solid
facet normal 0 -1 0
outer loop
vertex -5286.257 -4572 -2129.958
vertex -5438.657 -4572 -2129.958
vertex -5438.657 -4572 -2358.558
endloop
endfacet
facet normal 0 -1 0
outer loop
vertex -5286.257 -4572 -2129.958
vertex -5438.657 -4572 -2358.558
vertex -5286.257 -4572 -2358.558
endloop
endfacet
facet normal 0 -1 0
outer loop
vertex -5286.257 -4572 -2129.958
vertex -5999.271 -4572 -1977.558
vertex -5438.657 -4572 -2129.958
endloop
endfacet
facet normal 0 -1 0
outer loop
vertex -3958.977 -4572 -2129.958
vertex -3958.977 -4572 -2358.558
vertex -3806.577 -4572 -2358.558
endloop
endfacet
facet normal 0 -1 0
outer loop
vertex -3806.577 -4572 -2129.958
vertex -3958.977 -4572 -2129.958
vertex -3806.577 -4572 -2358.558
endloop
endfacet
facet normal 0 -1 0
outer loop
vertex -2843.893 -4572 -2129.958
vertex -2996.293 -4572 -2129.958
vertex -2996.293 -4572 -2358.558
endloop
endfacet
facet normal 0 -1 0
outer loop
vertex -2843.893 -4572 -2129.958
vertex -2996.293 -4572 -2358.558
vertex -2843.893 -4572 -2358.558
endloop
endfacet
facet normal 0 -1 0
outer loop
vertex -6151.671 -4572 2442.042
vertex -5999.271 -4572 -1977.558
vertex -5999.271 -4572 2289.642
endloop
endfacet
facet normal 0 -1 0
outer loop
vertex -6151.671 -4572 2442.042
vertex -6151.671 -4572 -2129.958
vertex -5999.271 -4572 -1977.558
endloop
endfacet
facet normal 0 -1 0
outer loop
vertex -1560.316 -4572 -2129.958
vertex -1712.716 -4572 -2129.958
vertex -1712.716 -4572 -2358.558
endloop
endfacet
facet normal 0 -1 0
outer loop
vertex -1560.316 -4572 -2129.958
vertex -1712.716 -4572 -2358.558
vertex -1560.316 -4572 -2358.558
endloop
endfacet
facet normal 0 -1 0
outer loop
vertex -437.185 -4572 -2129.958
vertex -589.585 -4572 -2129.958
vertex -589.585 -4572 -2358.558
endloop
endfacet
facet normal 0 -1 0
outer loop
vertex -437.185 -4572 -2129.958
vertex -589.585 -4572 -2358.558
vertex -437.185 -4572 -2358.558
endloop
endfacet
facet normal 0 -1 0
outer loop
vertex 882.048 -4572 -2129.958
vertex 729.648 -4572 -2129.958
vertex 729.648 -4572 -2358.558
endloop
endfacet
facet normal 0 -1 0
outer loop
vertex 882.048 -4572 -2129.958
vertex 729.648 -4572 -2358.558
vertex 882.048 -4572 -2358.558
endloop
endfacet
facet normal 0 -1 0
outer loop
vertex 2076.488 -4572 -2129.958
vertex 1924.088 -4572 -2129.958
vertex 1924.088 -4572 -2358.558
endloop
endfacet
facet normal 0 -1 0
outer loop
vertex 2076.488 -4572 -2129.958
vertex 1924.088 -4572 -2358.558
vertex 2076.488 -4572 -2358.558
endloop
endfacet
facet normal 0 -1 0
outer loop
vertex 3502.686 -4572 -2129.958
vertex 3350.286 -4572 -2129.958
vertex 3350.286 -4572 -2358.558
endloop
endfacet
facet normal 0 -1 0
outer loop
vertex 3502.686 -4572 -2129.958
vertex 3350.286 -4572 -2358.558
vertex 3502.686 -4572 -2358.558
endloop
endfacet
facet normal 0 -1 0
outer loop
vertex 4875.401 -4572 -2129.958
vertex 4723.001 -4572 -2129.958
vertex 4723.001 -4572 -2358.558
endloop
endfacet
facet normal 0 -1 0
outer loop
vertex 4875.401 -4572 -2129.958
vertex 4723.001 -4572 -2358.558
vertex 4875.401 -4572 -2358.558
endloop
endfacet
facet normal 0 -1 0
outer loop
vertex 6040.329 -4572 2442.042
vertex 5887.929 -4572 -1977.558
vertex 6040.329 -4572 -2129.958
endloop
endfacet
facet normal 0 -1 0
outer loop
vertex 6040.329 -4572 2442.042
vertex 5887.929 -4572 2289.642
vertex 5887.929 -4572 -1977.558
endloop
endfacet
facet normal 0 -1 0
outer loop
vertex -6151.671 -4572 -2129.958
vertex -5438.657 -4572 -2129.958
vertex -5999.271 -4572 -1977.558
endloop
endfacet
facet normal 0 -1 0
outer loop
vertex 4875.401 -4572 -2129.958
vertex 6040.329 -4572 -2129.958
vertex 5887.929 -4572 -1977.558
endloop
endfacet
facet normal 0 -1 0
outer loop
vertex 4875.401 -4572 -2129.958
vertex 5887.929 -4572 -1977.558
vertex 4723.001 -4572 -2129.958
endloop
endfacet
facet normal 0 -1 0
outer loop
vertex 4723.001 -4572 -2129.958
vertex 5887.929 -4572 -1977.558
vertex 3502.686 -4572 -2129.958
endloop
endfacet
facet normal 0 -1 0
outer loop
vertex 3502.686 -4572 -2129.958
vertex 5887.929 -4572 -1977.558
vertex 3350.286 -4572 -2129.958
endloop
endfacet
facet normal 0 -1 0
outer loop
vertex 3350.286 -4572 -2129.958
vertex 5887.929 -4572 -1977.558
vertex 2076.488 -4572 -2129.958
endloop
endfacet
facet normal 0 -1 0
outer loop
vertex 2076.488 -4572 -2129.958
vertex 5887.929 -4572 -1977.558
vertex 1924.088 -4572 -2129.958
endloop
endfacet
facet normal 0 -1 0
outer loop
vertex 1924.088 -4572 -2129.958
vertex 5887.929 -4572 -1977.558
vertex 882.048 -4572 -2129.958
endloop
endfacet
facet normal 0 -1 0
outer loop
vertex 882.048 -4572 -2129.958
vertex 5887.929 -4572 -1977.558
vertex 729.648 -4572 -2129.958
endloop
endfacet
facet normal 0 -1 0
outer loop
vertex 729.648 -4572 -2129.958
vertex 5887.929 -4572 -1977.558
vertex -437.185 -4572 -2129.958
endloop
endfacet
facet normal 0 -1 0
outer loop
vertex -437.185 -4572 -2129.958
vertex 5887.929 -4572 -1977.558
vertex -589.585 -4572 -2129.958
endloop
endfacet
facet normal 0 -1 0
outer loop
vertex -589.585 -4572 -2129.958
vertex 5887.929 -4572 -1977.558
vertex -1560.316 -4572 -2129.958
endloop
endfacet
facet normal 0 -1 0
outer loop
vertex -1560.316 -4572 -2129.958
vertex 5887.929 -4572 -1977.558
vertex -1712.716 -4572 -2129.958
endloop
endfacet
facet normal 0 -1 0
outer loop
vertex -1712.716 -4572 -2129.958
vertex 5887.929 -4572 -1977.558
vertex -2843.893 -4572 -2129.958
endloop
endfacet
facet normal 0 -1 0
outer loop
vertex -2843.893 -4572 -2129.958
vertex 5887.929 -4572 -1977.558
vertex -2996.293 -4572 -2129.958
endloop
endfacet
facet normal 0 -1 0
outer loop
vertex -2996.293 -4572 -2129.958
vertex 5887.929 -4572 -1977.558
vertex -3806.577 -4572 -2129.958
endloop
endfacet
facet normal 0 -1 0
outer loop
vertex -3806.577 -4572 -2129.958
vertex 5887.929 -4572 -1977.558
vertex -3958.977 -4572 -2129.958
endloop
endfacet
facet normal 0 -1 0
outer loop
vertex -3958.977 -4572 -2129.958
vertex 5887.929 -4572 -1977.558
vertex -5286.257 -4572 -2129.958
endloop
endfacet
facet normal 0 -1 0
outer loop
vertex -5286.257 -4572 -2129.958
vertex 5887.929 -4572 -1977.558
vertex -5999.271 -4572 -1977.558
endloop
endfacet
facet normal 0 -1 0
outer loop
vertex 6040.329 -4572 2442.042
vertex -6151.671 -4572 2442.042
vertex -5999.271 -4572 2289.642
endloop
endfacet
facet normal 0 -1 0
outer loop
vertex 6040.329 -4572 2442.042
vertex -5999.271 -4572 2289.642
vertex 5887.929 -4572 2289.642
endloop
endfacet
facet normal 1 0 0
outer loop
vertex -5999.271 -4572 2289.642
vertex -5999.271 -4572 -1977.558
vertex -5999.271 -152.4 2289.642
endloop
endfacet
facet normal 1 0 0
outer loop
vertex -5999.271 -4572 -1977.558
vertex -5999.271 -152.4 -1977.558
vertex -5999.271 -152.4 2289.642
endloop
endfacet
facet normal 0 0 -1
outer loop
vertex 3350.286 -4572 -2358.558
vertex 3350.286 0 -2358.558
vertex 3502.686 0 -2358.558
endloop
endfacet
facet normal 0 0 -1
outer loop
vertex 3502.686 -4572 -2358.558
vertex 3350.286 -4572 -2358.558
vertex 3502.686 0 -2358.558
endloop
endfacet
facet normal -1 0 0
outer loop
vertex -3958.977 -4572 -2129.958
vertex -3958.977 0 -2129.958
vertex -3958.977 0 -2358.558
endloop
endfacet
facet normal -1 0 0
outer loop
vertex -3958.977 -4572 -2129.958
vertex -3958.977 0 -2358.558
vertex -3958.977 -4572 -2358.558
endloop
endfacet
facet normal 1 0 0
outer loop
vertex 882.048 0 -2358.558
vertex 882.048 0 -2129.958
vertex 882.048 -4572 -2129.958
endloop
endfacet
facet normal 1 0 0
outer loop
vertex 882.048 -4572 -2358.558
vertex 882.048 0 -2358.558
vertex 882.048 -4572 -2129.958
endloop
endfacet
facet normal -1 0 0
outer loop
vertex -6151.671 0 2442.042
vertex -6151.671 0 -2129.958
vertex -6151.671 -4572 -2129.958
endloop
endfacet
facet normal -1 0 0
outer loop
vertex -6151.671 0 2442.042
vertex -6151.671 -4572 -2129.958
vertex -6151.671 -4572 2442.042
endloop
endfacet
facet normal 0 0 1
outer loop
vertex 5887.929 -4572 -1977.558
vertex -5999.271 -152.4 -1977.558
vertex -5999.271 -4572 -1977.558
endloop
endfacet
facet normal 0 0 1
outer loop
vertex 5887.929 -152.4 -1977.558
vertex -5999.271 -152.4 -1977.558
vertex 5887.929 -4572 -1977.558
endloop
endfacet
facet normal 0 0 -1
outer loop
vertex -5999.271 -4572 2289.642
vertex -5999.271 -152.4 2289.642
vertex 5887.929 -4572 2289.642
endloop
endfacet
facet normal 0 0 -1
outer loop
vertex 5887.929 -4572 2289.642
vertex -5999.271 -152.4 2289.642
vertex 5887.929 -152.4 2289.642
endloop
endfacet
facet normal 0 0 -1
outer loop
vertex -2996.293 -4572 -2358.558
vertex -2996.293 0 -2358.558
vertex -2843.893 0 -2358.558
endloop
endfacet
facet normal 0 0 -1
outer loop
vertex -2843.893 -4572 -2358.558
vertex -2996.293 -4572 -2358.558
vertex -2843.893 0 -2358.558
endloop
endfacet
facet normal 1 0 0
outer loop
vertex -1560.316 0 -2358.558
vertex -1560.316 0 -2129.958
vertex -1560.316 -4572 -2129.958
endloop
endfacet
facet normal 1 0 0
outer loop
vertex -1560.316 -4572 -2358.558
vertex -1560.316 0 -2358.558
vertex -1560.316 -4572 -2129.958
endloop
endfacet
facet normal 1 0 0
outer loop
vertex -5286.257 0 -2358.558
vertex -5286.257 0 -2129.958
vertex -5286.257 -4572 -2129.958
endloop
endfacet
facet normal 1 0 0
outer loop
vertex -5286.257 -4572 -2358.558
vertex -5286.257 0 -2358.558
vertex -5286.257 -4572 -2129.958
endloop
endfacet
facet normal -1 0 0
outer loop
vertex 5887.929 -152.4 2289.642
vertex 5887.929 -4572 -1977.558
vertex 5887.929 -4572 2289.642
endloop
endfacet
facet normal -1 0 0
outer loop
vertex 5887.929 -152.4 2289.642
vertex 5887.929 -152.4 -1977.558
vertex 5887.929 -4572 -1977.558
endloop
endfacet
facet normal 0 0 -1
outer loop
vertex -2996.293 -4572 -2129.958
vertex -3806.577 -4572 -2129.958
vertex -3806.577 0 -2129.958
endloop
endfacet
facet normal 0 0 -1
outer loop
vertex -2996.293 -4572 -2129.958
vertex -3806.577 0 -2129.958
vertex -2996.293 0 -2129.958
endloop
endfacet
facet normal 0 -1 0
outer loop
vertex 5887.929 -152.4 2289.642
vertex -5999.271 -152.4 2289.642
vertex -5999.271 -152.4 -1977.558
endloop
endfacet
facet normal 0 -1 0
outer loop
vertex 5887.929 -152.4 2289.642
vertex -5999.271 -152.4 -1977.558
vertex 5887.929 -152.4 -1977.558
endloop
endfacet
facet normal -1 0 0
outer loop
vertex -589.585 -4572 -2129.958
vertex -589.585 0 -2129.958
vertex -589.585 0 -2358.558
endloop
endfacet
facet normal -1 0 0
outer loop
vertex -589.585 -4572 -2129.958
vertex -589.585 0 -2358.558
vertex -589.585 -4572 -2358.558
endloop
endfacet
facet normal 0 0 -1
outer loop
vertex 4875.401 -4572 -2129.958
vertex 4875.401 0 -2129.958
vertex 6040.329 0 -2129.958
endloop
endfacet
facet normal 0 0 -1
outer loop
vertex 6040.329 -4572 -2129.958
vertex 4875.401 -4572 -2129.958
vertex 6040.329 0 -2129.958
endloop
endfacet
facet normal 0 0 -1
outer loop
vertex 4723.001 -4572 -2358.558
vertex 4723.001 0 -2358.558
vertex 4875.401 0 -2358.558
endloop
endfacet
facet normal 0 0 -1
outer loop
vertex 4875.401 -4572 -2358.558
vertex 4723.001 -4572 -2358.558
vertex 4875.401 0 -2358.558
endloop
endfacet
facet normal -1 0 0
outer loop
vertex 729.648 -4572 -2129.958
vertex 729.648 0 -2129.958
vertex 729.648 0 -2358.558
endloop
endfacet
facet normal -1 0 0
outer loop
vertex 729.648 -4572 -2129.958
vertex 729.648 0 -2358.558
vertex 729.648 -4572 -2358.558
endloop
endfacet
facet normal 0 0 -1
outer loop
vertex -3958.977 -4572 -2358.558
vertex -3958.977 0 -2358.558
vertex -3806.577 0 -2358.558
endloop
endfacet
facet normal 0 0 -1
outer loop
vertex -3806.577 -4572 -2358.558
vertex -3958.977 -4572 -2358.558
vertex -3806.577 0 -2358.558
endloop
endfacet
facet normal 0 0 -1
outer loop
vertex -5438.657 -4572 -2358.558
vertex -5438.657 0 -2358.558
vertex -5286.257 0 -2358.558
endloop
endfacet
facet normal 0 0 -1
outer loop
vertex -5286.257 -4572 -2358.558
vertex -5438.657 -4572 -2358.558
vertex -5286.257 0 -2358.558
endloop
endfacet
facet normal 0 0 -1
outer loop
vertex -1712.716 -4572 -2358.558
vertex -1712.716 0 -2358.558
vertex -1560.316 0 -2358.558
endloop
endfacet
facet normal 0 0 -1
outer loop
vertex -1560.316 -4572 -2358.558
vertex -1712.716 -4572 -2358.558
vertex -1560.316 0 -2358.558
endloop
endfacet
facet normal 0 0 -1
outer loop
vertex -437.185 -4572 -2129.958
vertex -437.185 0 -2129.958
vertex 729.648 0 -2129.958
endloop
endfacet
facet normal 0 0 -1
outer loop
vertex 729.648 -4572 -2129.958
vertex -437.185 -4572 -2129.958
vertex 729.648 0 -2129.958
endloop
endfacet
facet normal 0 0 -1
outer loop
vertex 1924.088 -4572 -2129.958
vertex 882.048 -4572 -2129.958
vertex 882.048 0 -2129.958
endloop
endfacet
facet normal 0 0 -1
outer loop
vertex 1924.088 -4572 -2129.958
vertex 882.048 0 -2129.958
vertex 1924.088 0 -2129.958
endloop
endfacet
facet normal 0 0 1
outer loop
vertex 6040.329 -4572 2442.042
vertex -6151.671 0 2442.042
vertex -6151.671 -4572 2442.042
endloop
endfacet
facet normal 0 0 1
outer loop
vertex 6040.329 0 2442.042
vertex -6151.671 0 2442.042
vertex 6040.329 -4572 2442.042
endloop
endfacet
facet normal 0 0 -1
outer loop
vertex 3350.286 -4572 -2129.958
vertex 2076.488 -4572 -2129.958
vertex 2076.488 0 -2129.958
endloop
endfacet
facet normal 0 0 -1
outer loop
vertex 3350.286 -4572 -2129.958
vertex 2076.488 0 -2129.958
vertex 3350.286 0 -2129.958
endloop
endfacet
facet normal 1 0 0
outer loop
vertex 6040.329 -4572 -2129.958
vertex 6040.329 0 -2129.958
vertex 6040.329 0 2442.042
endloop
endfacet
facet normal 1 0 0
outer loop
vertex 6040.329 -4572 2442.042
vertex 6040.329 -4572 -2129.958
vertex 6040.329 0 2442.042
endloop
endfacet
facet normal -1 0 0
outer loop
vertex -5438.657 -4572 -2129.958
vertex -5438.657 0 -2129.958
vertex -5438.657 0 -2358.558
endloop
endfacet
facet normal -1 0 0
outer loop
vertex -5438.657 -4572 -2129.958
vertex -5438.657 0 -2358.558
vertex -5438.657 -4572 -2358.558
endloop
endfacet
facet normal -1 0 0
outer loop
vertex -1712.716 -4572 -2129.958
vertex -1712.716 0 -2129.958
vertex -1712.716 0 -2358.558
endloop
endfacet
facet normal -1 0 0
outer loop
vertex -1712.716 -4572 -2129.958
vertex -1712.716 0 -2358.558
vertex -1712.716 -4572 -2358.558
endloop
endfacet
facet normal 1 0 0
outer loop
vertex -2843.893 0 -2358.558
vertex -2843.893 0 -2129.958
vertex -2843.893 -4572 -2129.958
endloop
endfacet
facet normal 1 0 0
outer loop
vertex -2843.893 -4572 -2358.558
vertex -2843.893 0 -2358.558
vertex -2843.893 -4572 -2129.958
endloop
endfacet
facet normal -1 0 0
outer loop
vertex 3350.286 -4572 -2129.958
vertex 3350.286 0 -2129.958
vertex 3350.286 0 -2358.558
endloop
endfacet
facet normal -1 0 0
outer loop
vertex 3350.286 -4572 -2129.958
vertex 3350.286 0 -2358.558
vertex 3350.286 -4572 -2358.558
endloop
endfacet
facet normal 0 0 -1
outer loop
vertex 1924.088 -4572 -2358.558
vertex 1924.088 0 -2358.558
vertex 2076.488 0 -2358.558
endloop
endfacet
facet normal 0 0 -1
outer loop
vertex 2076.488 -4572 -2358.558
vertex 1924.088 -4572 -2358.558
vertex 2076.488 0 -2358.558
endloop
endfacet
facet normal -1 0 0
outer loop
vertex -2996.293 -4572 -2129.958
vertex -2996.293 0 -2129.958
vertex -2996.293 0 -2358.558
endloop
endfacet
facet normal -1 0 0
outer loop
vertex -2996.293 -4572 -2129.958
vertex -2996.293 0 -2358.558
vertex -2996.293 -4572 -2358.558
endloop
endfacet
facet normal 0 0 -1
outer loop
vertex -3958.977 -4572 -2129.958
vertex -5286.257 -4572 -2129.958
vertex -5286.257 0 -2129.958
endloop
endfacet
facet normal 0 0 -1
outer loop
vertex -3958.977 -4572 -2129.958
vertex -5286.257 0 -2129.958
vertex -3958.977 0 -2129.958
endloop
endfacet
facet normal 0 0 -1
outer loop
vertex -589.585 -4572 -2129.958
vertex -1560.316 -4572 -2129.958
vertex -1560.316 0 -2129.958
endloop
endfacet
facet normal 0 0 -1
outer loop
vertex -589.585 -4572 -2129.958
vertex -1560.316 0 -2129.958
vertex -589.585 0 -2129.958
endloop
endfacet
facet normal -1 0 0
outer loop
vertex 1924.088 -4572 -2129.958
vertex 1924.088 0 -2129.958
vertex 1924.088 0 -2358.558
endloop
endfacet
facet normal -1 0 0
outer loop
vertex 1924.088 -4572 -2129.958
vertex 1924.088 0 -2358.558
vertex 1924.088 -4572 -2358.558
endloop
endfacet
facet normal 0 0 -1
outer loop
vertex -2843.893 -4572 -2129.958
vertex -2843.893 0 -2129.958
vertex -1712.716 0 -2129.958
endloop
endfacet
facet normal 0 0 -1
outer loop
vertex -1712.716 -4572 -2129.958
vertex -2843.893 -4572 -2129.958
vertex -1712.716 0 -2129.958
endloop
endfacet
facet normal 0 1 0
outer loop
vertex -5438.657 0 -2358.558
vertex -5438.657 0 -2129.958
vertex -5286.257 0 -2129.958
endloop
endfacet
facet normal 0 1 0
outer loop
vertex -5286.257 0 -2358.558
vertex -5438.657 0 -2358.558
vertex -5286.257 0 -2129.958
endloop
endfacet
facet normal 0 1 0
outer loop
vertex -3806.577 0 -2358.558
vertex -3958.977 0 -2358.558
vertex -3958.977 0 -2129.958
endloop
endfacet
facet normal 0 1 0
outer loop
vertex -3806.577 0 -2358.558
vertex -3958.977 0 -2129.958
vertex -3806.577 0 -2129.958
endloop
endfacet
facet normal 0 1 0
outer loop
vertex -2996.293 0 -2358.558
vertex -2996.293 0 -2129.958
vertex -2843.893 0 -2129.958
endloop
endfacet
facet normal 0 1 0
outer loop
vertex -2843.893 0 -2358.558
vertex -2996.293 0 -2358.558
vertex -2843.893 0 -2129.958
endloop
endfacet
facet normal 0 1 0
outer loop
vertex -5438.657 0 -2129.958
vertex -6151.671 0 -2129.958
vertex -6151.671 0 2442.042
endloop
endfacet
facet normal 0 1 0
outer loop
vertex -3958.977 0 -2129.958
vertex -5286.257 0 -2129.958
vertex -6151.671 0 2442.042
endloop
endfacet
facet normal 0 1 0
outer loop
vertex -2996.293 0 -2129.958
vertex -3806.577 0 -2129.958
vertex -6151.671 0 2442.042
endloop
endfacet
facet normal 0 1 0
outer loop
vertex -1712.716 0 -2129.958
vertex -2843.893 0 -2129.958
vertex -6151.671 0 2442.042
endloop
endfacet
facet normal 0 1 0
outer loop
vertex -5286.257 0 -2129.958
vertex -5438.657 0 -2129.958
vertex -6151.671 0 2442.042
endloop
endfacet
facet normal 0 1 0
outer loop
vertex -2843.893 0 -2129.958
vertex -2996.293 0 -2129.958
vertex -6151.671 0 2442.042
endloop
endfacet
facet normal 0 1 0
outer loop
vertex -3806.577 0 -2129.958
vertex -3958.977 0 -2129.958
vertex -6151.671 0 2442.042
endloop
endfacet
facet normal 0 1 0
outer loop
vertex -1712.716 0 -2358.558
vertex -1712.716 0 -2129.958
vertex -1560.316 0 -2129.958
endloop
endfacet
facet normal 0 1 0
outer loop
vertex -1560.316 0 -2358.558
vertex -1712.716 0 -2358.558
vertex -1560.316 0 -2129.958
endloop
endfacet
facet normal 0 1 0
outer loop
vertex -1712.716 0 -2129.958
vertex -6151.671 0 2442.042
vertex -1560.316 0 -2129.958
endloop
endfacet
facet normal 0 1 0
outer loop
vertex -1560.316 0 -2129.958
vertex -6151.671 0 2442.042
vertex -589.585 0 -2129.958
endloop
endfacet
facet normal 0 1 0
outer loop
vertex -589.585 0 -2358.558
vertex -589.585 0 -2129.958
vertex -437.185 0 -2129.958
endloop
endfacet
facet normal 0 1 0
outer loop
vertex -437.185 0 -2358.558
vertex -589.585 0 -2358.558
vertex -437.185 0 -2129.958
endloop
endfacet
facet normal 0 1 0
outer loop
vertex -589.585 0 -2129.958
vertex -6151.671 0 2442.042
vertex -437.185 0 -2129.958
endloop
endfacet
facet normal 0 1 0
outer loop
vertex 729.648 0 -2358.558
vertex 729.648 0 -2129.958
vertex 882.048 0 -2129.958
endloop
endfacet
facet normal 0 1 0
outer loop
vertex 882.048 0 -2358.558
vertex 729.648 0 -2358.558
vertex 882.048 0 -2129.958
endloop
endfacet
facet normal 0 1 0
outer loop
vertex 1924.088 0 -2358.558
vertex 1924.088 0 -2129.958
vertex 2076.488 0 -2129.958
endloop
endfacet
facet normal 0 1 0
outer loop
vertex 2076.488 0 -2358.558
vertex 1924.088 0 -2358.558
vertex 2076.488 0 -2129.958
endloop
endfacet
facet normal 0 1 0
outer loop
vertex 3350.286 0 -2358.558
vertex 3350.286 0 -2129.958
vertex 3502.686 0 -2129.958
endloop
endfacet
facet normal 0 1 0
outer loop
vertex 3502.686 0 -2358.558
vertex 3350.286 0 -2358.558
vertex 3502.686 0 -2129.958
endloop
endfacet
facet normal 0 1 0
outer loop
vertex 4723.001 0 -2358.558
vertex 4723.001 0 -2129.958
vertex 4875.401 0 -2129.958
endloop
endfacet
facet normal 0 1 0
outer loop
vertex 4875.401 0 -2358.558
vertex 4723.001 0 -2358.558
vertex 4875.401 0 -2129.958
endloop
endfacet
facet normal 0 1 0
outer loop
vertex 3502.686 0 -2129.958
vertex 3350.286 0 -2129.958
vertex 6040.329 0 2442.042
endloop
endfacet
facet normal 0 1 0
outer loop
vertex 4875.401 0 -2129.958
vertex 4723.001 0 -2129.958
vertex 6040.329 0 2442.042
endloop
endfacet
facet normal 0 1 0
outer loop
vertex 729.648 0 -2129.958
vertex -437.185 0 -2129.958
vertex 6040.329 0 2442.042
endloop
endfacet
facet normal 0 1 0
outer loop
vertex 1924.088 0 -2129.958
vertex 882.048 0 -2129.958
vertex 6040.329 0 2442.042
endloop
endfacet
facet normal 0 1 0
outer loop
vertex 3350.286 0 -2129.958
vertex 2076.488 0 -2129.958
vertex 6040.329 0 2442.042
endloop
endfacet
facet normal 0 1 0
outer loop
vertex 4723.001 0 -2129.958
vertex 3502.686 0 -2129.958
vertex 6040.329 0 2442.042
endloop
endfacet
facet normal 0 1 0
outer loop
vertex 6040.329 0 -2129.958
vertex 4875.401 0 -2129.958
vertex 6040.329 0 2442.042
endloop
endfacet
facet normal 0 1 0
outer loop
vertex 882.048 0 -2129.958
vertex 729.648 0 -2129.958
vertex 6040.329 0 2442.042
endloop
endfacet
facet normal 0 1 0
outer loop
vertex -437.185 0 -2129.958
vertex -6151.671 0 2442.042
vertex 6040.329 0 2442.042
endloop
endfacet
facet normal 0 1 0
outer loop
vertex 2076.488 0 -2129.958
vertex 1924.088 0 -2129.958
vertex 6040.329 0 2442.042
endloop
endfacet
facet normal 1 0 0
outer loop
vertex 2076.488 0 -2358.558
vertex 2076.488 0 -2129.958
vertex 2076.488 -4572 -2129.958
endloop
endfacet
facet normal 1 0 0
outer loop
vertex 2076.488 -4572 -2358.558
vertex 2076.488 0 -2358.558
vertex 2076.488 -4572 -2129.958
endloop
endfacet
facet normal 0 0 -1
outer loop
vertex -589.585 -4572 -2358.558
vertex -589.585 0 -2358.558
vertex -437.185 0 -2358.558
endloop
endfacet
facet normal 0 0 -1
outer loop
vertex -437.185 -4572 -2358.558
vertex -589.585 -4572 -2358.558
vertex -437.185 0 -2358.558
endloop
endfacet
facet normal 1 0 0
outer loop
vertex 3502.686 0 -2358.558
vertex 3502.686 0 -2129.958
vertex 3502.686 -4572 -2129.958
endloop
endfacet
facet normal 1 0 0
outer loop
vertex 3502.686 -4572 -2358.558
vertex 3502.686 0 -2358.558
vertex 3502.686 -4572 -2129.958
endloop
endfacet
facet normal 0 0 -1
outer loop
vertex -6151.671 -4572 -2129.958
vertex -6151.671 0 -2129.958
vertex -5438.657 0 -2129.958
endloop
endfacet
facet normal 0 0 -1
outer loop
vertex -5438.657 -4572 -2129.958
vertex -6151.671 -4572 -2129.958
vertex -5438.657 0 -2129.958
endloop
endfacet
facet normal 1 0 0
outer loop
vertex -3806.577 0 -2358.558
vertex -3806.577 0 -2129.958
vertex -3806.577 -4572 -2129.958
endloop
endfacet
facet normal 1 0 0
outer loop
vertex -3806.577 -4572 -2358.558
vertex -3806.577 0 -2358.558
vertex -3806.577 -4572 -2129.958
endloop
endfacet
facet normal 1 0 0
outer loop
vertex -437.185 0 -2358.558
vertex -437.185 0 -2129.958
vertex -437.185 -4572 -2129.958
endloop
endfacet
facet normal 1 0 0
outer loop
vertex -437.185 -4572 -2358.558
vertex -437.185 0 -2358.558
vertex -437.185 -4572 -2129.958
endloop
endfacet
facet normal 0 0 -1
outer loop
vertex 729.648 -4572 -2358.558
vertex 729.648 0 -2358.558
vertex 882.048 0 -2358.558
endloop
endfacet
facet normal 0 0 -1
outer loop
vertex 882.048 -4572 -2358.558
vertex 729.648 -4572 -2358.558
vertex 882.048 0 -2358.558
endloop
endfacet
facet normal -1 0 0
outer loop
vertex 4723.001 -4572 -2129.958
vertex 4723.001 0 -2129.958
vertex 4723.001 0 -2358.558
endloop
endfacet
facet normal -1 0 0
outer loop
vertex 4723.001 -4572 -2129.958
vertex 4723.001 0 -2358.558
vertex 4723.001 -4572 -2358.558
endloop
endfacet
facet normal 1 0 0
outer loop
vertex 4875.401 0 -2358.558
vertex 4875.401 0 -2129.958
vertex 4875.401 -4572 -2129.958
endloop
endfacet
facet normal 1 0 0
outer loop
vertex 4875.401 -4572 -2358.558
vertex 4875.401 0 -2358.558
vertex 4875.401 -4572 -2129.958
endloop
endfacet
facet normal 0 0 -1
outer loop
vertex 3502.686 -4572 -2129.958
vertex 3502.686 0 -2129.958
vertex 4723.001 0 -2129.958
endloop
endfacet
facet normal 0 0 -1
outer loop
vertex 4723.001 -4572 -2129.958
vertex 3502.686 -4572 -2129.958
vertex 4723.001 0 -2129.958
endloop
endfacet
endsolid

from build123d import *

# Parameters (mm, degrees)
F0_W     = 12192
F0_H     = 4572
F1_DEPTH = 4572
F2_T     = -152.4
F3_W     = 152.4
F3_H     = 4572
F4_DEPTH = 228.6


with BuildPart() as f1:
    # F0 (on Front) → F1 (new body)
    with BuildSketch(Plane.XZ):
        with Locations((-55.671293, 156.041737)):
            Rectangle(F0_W, F0_H)
    extrude(amount=F1_DEPTH)

    # F2
    f2_openings = [f1.faces().sort_by_distance(p)[0] for p in [
        (-55.671293, -4572, 156.041737),
    ]]
    offset(amount=F2_T, openings=f2_openings)

    # F3 (on face) → F4 (join)
    with BuildSketch(Plane(origin=(0, 0, -2129.958263), x_dir=(1, 0, 0), z_dir=(0, 0, -1))):
        with Locations((4799.200526, 2286)):
            Rectangle(F3_W, F3_H)
        with Locations((3426.486007, 2286)):
            Rectangle(F3_W, F3_H)
        with Locations((2000.28812, 2286)):
            Rectangle(F3_W, F3_H)
        with Locations((805.847875, 2286)):
            Rectangle(F3_W, F3_H)
        with Locations((-513.384887, 2286)):
            Rectangle(F3_W, F3_H)
        with Locations((-1636.515507, 2286)):
            Rectangle(F3_W, F3_H)
        with Locations((-2920.093306, 2286)):
            Rectangle(F3_W, F3_H)
        with Locations((-3882.776507, 2286)):
            Rectangle(F3_W, F3_H)
        with Locations((-5362.456807, 2286)):
            Rectangle(F3_W, F3_H)
    extrude(amount=F4_DEPTH)


solid = f1.part
